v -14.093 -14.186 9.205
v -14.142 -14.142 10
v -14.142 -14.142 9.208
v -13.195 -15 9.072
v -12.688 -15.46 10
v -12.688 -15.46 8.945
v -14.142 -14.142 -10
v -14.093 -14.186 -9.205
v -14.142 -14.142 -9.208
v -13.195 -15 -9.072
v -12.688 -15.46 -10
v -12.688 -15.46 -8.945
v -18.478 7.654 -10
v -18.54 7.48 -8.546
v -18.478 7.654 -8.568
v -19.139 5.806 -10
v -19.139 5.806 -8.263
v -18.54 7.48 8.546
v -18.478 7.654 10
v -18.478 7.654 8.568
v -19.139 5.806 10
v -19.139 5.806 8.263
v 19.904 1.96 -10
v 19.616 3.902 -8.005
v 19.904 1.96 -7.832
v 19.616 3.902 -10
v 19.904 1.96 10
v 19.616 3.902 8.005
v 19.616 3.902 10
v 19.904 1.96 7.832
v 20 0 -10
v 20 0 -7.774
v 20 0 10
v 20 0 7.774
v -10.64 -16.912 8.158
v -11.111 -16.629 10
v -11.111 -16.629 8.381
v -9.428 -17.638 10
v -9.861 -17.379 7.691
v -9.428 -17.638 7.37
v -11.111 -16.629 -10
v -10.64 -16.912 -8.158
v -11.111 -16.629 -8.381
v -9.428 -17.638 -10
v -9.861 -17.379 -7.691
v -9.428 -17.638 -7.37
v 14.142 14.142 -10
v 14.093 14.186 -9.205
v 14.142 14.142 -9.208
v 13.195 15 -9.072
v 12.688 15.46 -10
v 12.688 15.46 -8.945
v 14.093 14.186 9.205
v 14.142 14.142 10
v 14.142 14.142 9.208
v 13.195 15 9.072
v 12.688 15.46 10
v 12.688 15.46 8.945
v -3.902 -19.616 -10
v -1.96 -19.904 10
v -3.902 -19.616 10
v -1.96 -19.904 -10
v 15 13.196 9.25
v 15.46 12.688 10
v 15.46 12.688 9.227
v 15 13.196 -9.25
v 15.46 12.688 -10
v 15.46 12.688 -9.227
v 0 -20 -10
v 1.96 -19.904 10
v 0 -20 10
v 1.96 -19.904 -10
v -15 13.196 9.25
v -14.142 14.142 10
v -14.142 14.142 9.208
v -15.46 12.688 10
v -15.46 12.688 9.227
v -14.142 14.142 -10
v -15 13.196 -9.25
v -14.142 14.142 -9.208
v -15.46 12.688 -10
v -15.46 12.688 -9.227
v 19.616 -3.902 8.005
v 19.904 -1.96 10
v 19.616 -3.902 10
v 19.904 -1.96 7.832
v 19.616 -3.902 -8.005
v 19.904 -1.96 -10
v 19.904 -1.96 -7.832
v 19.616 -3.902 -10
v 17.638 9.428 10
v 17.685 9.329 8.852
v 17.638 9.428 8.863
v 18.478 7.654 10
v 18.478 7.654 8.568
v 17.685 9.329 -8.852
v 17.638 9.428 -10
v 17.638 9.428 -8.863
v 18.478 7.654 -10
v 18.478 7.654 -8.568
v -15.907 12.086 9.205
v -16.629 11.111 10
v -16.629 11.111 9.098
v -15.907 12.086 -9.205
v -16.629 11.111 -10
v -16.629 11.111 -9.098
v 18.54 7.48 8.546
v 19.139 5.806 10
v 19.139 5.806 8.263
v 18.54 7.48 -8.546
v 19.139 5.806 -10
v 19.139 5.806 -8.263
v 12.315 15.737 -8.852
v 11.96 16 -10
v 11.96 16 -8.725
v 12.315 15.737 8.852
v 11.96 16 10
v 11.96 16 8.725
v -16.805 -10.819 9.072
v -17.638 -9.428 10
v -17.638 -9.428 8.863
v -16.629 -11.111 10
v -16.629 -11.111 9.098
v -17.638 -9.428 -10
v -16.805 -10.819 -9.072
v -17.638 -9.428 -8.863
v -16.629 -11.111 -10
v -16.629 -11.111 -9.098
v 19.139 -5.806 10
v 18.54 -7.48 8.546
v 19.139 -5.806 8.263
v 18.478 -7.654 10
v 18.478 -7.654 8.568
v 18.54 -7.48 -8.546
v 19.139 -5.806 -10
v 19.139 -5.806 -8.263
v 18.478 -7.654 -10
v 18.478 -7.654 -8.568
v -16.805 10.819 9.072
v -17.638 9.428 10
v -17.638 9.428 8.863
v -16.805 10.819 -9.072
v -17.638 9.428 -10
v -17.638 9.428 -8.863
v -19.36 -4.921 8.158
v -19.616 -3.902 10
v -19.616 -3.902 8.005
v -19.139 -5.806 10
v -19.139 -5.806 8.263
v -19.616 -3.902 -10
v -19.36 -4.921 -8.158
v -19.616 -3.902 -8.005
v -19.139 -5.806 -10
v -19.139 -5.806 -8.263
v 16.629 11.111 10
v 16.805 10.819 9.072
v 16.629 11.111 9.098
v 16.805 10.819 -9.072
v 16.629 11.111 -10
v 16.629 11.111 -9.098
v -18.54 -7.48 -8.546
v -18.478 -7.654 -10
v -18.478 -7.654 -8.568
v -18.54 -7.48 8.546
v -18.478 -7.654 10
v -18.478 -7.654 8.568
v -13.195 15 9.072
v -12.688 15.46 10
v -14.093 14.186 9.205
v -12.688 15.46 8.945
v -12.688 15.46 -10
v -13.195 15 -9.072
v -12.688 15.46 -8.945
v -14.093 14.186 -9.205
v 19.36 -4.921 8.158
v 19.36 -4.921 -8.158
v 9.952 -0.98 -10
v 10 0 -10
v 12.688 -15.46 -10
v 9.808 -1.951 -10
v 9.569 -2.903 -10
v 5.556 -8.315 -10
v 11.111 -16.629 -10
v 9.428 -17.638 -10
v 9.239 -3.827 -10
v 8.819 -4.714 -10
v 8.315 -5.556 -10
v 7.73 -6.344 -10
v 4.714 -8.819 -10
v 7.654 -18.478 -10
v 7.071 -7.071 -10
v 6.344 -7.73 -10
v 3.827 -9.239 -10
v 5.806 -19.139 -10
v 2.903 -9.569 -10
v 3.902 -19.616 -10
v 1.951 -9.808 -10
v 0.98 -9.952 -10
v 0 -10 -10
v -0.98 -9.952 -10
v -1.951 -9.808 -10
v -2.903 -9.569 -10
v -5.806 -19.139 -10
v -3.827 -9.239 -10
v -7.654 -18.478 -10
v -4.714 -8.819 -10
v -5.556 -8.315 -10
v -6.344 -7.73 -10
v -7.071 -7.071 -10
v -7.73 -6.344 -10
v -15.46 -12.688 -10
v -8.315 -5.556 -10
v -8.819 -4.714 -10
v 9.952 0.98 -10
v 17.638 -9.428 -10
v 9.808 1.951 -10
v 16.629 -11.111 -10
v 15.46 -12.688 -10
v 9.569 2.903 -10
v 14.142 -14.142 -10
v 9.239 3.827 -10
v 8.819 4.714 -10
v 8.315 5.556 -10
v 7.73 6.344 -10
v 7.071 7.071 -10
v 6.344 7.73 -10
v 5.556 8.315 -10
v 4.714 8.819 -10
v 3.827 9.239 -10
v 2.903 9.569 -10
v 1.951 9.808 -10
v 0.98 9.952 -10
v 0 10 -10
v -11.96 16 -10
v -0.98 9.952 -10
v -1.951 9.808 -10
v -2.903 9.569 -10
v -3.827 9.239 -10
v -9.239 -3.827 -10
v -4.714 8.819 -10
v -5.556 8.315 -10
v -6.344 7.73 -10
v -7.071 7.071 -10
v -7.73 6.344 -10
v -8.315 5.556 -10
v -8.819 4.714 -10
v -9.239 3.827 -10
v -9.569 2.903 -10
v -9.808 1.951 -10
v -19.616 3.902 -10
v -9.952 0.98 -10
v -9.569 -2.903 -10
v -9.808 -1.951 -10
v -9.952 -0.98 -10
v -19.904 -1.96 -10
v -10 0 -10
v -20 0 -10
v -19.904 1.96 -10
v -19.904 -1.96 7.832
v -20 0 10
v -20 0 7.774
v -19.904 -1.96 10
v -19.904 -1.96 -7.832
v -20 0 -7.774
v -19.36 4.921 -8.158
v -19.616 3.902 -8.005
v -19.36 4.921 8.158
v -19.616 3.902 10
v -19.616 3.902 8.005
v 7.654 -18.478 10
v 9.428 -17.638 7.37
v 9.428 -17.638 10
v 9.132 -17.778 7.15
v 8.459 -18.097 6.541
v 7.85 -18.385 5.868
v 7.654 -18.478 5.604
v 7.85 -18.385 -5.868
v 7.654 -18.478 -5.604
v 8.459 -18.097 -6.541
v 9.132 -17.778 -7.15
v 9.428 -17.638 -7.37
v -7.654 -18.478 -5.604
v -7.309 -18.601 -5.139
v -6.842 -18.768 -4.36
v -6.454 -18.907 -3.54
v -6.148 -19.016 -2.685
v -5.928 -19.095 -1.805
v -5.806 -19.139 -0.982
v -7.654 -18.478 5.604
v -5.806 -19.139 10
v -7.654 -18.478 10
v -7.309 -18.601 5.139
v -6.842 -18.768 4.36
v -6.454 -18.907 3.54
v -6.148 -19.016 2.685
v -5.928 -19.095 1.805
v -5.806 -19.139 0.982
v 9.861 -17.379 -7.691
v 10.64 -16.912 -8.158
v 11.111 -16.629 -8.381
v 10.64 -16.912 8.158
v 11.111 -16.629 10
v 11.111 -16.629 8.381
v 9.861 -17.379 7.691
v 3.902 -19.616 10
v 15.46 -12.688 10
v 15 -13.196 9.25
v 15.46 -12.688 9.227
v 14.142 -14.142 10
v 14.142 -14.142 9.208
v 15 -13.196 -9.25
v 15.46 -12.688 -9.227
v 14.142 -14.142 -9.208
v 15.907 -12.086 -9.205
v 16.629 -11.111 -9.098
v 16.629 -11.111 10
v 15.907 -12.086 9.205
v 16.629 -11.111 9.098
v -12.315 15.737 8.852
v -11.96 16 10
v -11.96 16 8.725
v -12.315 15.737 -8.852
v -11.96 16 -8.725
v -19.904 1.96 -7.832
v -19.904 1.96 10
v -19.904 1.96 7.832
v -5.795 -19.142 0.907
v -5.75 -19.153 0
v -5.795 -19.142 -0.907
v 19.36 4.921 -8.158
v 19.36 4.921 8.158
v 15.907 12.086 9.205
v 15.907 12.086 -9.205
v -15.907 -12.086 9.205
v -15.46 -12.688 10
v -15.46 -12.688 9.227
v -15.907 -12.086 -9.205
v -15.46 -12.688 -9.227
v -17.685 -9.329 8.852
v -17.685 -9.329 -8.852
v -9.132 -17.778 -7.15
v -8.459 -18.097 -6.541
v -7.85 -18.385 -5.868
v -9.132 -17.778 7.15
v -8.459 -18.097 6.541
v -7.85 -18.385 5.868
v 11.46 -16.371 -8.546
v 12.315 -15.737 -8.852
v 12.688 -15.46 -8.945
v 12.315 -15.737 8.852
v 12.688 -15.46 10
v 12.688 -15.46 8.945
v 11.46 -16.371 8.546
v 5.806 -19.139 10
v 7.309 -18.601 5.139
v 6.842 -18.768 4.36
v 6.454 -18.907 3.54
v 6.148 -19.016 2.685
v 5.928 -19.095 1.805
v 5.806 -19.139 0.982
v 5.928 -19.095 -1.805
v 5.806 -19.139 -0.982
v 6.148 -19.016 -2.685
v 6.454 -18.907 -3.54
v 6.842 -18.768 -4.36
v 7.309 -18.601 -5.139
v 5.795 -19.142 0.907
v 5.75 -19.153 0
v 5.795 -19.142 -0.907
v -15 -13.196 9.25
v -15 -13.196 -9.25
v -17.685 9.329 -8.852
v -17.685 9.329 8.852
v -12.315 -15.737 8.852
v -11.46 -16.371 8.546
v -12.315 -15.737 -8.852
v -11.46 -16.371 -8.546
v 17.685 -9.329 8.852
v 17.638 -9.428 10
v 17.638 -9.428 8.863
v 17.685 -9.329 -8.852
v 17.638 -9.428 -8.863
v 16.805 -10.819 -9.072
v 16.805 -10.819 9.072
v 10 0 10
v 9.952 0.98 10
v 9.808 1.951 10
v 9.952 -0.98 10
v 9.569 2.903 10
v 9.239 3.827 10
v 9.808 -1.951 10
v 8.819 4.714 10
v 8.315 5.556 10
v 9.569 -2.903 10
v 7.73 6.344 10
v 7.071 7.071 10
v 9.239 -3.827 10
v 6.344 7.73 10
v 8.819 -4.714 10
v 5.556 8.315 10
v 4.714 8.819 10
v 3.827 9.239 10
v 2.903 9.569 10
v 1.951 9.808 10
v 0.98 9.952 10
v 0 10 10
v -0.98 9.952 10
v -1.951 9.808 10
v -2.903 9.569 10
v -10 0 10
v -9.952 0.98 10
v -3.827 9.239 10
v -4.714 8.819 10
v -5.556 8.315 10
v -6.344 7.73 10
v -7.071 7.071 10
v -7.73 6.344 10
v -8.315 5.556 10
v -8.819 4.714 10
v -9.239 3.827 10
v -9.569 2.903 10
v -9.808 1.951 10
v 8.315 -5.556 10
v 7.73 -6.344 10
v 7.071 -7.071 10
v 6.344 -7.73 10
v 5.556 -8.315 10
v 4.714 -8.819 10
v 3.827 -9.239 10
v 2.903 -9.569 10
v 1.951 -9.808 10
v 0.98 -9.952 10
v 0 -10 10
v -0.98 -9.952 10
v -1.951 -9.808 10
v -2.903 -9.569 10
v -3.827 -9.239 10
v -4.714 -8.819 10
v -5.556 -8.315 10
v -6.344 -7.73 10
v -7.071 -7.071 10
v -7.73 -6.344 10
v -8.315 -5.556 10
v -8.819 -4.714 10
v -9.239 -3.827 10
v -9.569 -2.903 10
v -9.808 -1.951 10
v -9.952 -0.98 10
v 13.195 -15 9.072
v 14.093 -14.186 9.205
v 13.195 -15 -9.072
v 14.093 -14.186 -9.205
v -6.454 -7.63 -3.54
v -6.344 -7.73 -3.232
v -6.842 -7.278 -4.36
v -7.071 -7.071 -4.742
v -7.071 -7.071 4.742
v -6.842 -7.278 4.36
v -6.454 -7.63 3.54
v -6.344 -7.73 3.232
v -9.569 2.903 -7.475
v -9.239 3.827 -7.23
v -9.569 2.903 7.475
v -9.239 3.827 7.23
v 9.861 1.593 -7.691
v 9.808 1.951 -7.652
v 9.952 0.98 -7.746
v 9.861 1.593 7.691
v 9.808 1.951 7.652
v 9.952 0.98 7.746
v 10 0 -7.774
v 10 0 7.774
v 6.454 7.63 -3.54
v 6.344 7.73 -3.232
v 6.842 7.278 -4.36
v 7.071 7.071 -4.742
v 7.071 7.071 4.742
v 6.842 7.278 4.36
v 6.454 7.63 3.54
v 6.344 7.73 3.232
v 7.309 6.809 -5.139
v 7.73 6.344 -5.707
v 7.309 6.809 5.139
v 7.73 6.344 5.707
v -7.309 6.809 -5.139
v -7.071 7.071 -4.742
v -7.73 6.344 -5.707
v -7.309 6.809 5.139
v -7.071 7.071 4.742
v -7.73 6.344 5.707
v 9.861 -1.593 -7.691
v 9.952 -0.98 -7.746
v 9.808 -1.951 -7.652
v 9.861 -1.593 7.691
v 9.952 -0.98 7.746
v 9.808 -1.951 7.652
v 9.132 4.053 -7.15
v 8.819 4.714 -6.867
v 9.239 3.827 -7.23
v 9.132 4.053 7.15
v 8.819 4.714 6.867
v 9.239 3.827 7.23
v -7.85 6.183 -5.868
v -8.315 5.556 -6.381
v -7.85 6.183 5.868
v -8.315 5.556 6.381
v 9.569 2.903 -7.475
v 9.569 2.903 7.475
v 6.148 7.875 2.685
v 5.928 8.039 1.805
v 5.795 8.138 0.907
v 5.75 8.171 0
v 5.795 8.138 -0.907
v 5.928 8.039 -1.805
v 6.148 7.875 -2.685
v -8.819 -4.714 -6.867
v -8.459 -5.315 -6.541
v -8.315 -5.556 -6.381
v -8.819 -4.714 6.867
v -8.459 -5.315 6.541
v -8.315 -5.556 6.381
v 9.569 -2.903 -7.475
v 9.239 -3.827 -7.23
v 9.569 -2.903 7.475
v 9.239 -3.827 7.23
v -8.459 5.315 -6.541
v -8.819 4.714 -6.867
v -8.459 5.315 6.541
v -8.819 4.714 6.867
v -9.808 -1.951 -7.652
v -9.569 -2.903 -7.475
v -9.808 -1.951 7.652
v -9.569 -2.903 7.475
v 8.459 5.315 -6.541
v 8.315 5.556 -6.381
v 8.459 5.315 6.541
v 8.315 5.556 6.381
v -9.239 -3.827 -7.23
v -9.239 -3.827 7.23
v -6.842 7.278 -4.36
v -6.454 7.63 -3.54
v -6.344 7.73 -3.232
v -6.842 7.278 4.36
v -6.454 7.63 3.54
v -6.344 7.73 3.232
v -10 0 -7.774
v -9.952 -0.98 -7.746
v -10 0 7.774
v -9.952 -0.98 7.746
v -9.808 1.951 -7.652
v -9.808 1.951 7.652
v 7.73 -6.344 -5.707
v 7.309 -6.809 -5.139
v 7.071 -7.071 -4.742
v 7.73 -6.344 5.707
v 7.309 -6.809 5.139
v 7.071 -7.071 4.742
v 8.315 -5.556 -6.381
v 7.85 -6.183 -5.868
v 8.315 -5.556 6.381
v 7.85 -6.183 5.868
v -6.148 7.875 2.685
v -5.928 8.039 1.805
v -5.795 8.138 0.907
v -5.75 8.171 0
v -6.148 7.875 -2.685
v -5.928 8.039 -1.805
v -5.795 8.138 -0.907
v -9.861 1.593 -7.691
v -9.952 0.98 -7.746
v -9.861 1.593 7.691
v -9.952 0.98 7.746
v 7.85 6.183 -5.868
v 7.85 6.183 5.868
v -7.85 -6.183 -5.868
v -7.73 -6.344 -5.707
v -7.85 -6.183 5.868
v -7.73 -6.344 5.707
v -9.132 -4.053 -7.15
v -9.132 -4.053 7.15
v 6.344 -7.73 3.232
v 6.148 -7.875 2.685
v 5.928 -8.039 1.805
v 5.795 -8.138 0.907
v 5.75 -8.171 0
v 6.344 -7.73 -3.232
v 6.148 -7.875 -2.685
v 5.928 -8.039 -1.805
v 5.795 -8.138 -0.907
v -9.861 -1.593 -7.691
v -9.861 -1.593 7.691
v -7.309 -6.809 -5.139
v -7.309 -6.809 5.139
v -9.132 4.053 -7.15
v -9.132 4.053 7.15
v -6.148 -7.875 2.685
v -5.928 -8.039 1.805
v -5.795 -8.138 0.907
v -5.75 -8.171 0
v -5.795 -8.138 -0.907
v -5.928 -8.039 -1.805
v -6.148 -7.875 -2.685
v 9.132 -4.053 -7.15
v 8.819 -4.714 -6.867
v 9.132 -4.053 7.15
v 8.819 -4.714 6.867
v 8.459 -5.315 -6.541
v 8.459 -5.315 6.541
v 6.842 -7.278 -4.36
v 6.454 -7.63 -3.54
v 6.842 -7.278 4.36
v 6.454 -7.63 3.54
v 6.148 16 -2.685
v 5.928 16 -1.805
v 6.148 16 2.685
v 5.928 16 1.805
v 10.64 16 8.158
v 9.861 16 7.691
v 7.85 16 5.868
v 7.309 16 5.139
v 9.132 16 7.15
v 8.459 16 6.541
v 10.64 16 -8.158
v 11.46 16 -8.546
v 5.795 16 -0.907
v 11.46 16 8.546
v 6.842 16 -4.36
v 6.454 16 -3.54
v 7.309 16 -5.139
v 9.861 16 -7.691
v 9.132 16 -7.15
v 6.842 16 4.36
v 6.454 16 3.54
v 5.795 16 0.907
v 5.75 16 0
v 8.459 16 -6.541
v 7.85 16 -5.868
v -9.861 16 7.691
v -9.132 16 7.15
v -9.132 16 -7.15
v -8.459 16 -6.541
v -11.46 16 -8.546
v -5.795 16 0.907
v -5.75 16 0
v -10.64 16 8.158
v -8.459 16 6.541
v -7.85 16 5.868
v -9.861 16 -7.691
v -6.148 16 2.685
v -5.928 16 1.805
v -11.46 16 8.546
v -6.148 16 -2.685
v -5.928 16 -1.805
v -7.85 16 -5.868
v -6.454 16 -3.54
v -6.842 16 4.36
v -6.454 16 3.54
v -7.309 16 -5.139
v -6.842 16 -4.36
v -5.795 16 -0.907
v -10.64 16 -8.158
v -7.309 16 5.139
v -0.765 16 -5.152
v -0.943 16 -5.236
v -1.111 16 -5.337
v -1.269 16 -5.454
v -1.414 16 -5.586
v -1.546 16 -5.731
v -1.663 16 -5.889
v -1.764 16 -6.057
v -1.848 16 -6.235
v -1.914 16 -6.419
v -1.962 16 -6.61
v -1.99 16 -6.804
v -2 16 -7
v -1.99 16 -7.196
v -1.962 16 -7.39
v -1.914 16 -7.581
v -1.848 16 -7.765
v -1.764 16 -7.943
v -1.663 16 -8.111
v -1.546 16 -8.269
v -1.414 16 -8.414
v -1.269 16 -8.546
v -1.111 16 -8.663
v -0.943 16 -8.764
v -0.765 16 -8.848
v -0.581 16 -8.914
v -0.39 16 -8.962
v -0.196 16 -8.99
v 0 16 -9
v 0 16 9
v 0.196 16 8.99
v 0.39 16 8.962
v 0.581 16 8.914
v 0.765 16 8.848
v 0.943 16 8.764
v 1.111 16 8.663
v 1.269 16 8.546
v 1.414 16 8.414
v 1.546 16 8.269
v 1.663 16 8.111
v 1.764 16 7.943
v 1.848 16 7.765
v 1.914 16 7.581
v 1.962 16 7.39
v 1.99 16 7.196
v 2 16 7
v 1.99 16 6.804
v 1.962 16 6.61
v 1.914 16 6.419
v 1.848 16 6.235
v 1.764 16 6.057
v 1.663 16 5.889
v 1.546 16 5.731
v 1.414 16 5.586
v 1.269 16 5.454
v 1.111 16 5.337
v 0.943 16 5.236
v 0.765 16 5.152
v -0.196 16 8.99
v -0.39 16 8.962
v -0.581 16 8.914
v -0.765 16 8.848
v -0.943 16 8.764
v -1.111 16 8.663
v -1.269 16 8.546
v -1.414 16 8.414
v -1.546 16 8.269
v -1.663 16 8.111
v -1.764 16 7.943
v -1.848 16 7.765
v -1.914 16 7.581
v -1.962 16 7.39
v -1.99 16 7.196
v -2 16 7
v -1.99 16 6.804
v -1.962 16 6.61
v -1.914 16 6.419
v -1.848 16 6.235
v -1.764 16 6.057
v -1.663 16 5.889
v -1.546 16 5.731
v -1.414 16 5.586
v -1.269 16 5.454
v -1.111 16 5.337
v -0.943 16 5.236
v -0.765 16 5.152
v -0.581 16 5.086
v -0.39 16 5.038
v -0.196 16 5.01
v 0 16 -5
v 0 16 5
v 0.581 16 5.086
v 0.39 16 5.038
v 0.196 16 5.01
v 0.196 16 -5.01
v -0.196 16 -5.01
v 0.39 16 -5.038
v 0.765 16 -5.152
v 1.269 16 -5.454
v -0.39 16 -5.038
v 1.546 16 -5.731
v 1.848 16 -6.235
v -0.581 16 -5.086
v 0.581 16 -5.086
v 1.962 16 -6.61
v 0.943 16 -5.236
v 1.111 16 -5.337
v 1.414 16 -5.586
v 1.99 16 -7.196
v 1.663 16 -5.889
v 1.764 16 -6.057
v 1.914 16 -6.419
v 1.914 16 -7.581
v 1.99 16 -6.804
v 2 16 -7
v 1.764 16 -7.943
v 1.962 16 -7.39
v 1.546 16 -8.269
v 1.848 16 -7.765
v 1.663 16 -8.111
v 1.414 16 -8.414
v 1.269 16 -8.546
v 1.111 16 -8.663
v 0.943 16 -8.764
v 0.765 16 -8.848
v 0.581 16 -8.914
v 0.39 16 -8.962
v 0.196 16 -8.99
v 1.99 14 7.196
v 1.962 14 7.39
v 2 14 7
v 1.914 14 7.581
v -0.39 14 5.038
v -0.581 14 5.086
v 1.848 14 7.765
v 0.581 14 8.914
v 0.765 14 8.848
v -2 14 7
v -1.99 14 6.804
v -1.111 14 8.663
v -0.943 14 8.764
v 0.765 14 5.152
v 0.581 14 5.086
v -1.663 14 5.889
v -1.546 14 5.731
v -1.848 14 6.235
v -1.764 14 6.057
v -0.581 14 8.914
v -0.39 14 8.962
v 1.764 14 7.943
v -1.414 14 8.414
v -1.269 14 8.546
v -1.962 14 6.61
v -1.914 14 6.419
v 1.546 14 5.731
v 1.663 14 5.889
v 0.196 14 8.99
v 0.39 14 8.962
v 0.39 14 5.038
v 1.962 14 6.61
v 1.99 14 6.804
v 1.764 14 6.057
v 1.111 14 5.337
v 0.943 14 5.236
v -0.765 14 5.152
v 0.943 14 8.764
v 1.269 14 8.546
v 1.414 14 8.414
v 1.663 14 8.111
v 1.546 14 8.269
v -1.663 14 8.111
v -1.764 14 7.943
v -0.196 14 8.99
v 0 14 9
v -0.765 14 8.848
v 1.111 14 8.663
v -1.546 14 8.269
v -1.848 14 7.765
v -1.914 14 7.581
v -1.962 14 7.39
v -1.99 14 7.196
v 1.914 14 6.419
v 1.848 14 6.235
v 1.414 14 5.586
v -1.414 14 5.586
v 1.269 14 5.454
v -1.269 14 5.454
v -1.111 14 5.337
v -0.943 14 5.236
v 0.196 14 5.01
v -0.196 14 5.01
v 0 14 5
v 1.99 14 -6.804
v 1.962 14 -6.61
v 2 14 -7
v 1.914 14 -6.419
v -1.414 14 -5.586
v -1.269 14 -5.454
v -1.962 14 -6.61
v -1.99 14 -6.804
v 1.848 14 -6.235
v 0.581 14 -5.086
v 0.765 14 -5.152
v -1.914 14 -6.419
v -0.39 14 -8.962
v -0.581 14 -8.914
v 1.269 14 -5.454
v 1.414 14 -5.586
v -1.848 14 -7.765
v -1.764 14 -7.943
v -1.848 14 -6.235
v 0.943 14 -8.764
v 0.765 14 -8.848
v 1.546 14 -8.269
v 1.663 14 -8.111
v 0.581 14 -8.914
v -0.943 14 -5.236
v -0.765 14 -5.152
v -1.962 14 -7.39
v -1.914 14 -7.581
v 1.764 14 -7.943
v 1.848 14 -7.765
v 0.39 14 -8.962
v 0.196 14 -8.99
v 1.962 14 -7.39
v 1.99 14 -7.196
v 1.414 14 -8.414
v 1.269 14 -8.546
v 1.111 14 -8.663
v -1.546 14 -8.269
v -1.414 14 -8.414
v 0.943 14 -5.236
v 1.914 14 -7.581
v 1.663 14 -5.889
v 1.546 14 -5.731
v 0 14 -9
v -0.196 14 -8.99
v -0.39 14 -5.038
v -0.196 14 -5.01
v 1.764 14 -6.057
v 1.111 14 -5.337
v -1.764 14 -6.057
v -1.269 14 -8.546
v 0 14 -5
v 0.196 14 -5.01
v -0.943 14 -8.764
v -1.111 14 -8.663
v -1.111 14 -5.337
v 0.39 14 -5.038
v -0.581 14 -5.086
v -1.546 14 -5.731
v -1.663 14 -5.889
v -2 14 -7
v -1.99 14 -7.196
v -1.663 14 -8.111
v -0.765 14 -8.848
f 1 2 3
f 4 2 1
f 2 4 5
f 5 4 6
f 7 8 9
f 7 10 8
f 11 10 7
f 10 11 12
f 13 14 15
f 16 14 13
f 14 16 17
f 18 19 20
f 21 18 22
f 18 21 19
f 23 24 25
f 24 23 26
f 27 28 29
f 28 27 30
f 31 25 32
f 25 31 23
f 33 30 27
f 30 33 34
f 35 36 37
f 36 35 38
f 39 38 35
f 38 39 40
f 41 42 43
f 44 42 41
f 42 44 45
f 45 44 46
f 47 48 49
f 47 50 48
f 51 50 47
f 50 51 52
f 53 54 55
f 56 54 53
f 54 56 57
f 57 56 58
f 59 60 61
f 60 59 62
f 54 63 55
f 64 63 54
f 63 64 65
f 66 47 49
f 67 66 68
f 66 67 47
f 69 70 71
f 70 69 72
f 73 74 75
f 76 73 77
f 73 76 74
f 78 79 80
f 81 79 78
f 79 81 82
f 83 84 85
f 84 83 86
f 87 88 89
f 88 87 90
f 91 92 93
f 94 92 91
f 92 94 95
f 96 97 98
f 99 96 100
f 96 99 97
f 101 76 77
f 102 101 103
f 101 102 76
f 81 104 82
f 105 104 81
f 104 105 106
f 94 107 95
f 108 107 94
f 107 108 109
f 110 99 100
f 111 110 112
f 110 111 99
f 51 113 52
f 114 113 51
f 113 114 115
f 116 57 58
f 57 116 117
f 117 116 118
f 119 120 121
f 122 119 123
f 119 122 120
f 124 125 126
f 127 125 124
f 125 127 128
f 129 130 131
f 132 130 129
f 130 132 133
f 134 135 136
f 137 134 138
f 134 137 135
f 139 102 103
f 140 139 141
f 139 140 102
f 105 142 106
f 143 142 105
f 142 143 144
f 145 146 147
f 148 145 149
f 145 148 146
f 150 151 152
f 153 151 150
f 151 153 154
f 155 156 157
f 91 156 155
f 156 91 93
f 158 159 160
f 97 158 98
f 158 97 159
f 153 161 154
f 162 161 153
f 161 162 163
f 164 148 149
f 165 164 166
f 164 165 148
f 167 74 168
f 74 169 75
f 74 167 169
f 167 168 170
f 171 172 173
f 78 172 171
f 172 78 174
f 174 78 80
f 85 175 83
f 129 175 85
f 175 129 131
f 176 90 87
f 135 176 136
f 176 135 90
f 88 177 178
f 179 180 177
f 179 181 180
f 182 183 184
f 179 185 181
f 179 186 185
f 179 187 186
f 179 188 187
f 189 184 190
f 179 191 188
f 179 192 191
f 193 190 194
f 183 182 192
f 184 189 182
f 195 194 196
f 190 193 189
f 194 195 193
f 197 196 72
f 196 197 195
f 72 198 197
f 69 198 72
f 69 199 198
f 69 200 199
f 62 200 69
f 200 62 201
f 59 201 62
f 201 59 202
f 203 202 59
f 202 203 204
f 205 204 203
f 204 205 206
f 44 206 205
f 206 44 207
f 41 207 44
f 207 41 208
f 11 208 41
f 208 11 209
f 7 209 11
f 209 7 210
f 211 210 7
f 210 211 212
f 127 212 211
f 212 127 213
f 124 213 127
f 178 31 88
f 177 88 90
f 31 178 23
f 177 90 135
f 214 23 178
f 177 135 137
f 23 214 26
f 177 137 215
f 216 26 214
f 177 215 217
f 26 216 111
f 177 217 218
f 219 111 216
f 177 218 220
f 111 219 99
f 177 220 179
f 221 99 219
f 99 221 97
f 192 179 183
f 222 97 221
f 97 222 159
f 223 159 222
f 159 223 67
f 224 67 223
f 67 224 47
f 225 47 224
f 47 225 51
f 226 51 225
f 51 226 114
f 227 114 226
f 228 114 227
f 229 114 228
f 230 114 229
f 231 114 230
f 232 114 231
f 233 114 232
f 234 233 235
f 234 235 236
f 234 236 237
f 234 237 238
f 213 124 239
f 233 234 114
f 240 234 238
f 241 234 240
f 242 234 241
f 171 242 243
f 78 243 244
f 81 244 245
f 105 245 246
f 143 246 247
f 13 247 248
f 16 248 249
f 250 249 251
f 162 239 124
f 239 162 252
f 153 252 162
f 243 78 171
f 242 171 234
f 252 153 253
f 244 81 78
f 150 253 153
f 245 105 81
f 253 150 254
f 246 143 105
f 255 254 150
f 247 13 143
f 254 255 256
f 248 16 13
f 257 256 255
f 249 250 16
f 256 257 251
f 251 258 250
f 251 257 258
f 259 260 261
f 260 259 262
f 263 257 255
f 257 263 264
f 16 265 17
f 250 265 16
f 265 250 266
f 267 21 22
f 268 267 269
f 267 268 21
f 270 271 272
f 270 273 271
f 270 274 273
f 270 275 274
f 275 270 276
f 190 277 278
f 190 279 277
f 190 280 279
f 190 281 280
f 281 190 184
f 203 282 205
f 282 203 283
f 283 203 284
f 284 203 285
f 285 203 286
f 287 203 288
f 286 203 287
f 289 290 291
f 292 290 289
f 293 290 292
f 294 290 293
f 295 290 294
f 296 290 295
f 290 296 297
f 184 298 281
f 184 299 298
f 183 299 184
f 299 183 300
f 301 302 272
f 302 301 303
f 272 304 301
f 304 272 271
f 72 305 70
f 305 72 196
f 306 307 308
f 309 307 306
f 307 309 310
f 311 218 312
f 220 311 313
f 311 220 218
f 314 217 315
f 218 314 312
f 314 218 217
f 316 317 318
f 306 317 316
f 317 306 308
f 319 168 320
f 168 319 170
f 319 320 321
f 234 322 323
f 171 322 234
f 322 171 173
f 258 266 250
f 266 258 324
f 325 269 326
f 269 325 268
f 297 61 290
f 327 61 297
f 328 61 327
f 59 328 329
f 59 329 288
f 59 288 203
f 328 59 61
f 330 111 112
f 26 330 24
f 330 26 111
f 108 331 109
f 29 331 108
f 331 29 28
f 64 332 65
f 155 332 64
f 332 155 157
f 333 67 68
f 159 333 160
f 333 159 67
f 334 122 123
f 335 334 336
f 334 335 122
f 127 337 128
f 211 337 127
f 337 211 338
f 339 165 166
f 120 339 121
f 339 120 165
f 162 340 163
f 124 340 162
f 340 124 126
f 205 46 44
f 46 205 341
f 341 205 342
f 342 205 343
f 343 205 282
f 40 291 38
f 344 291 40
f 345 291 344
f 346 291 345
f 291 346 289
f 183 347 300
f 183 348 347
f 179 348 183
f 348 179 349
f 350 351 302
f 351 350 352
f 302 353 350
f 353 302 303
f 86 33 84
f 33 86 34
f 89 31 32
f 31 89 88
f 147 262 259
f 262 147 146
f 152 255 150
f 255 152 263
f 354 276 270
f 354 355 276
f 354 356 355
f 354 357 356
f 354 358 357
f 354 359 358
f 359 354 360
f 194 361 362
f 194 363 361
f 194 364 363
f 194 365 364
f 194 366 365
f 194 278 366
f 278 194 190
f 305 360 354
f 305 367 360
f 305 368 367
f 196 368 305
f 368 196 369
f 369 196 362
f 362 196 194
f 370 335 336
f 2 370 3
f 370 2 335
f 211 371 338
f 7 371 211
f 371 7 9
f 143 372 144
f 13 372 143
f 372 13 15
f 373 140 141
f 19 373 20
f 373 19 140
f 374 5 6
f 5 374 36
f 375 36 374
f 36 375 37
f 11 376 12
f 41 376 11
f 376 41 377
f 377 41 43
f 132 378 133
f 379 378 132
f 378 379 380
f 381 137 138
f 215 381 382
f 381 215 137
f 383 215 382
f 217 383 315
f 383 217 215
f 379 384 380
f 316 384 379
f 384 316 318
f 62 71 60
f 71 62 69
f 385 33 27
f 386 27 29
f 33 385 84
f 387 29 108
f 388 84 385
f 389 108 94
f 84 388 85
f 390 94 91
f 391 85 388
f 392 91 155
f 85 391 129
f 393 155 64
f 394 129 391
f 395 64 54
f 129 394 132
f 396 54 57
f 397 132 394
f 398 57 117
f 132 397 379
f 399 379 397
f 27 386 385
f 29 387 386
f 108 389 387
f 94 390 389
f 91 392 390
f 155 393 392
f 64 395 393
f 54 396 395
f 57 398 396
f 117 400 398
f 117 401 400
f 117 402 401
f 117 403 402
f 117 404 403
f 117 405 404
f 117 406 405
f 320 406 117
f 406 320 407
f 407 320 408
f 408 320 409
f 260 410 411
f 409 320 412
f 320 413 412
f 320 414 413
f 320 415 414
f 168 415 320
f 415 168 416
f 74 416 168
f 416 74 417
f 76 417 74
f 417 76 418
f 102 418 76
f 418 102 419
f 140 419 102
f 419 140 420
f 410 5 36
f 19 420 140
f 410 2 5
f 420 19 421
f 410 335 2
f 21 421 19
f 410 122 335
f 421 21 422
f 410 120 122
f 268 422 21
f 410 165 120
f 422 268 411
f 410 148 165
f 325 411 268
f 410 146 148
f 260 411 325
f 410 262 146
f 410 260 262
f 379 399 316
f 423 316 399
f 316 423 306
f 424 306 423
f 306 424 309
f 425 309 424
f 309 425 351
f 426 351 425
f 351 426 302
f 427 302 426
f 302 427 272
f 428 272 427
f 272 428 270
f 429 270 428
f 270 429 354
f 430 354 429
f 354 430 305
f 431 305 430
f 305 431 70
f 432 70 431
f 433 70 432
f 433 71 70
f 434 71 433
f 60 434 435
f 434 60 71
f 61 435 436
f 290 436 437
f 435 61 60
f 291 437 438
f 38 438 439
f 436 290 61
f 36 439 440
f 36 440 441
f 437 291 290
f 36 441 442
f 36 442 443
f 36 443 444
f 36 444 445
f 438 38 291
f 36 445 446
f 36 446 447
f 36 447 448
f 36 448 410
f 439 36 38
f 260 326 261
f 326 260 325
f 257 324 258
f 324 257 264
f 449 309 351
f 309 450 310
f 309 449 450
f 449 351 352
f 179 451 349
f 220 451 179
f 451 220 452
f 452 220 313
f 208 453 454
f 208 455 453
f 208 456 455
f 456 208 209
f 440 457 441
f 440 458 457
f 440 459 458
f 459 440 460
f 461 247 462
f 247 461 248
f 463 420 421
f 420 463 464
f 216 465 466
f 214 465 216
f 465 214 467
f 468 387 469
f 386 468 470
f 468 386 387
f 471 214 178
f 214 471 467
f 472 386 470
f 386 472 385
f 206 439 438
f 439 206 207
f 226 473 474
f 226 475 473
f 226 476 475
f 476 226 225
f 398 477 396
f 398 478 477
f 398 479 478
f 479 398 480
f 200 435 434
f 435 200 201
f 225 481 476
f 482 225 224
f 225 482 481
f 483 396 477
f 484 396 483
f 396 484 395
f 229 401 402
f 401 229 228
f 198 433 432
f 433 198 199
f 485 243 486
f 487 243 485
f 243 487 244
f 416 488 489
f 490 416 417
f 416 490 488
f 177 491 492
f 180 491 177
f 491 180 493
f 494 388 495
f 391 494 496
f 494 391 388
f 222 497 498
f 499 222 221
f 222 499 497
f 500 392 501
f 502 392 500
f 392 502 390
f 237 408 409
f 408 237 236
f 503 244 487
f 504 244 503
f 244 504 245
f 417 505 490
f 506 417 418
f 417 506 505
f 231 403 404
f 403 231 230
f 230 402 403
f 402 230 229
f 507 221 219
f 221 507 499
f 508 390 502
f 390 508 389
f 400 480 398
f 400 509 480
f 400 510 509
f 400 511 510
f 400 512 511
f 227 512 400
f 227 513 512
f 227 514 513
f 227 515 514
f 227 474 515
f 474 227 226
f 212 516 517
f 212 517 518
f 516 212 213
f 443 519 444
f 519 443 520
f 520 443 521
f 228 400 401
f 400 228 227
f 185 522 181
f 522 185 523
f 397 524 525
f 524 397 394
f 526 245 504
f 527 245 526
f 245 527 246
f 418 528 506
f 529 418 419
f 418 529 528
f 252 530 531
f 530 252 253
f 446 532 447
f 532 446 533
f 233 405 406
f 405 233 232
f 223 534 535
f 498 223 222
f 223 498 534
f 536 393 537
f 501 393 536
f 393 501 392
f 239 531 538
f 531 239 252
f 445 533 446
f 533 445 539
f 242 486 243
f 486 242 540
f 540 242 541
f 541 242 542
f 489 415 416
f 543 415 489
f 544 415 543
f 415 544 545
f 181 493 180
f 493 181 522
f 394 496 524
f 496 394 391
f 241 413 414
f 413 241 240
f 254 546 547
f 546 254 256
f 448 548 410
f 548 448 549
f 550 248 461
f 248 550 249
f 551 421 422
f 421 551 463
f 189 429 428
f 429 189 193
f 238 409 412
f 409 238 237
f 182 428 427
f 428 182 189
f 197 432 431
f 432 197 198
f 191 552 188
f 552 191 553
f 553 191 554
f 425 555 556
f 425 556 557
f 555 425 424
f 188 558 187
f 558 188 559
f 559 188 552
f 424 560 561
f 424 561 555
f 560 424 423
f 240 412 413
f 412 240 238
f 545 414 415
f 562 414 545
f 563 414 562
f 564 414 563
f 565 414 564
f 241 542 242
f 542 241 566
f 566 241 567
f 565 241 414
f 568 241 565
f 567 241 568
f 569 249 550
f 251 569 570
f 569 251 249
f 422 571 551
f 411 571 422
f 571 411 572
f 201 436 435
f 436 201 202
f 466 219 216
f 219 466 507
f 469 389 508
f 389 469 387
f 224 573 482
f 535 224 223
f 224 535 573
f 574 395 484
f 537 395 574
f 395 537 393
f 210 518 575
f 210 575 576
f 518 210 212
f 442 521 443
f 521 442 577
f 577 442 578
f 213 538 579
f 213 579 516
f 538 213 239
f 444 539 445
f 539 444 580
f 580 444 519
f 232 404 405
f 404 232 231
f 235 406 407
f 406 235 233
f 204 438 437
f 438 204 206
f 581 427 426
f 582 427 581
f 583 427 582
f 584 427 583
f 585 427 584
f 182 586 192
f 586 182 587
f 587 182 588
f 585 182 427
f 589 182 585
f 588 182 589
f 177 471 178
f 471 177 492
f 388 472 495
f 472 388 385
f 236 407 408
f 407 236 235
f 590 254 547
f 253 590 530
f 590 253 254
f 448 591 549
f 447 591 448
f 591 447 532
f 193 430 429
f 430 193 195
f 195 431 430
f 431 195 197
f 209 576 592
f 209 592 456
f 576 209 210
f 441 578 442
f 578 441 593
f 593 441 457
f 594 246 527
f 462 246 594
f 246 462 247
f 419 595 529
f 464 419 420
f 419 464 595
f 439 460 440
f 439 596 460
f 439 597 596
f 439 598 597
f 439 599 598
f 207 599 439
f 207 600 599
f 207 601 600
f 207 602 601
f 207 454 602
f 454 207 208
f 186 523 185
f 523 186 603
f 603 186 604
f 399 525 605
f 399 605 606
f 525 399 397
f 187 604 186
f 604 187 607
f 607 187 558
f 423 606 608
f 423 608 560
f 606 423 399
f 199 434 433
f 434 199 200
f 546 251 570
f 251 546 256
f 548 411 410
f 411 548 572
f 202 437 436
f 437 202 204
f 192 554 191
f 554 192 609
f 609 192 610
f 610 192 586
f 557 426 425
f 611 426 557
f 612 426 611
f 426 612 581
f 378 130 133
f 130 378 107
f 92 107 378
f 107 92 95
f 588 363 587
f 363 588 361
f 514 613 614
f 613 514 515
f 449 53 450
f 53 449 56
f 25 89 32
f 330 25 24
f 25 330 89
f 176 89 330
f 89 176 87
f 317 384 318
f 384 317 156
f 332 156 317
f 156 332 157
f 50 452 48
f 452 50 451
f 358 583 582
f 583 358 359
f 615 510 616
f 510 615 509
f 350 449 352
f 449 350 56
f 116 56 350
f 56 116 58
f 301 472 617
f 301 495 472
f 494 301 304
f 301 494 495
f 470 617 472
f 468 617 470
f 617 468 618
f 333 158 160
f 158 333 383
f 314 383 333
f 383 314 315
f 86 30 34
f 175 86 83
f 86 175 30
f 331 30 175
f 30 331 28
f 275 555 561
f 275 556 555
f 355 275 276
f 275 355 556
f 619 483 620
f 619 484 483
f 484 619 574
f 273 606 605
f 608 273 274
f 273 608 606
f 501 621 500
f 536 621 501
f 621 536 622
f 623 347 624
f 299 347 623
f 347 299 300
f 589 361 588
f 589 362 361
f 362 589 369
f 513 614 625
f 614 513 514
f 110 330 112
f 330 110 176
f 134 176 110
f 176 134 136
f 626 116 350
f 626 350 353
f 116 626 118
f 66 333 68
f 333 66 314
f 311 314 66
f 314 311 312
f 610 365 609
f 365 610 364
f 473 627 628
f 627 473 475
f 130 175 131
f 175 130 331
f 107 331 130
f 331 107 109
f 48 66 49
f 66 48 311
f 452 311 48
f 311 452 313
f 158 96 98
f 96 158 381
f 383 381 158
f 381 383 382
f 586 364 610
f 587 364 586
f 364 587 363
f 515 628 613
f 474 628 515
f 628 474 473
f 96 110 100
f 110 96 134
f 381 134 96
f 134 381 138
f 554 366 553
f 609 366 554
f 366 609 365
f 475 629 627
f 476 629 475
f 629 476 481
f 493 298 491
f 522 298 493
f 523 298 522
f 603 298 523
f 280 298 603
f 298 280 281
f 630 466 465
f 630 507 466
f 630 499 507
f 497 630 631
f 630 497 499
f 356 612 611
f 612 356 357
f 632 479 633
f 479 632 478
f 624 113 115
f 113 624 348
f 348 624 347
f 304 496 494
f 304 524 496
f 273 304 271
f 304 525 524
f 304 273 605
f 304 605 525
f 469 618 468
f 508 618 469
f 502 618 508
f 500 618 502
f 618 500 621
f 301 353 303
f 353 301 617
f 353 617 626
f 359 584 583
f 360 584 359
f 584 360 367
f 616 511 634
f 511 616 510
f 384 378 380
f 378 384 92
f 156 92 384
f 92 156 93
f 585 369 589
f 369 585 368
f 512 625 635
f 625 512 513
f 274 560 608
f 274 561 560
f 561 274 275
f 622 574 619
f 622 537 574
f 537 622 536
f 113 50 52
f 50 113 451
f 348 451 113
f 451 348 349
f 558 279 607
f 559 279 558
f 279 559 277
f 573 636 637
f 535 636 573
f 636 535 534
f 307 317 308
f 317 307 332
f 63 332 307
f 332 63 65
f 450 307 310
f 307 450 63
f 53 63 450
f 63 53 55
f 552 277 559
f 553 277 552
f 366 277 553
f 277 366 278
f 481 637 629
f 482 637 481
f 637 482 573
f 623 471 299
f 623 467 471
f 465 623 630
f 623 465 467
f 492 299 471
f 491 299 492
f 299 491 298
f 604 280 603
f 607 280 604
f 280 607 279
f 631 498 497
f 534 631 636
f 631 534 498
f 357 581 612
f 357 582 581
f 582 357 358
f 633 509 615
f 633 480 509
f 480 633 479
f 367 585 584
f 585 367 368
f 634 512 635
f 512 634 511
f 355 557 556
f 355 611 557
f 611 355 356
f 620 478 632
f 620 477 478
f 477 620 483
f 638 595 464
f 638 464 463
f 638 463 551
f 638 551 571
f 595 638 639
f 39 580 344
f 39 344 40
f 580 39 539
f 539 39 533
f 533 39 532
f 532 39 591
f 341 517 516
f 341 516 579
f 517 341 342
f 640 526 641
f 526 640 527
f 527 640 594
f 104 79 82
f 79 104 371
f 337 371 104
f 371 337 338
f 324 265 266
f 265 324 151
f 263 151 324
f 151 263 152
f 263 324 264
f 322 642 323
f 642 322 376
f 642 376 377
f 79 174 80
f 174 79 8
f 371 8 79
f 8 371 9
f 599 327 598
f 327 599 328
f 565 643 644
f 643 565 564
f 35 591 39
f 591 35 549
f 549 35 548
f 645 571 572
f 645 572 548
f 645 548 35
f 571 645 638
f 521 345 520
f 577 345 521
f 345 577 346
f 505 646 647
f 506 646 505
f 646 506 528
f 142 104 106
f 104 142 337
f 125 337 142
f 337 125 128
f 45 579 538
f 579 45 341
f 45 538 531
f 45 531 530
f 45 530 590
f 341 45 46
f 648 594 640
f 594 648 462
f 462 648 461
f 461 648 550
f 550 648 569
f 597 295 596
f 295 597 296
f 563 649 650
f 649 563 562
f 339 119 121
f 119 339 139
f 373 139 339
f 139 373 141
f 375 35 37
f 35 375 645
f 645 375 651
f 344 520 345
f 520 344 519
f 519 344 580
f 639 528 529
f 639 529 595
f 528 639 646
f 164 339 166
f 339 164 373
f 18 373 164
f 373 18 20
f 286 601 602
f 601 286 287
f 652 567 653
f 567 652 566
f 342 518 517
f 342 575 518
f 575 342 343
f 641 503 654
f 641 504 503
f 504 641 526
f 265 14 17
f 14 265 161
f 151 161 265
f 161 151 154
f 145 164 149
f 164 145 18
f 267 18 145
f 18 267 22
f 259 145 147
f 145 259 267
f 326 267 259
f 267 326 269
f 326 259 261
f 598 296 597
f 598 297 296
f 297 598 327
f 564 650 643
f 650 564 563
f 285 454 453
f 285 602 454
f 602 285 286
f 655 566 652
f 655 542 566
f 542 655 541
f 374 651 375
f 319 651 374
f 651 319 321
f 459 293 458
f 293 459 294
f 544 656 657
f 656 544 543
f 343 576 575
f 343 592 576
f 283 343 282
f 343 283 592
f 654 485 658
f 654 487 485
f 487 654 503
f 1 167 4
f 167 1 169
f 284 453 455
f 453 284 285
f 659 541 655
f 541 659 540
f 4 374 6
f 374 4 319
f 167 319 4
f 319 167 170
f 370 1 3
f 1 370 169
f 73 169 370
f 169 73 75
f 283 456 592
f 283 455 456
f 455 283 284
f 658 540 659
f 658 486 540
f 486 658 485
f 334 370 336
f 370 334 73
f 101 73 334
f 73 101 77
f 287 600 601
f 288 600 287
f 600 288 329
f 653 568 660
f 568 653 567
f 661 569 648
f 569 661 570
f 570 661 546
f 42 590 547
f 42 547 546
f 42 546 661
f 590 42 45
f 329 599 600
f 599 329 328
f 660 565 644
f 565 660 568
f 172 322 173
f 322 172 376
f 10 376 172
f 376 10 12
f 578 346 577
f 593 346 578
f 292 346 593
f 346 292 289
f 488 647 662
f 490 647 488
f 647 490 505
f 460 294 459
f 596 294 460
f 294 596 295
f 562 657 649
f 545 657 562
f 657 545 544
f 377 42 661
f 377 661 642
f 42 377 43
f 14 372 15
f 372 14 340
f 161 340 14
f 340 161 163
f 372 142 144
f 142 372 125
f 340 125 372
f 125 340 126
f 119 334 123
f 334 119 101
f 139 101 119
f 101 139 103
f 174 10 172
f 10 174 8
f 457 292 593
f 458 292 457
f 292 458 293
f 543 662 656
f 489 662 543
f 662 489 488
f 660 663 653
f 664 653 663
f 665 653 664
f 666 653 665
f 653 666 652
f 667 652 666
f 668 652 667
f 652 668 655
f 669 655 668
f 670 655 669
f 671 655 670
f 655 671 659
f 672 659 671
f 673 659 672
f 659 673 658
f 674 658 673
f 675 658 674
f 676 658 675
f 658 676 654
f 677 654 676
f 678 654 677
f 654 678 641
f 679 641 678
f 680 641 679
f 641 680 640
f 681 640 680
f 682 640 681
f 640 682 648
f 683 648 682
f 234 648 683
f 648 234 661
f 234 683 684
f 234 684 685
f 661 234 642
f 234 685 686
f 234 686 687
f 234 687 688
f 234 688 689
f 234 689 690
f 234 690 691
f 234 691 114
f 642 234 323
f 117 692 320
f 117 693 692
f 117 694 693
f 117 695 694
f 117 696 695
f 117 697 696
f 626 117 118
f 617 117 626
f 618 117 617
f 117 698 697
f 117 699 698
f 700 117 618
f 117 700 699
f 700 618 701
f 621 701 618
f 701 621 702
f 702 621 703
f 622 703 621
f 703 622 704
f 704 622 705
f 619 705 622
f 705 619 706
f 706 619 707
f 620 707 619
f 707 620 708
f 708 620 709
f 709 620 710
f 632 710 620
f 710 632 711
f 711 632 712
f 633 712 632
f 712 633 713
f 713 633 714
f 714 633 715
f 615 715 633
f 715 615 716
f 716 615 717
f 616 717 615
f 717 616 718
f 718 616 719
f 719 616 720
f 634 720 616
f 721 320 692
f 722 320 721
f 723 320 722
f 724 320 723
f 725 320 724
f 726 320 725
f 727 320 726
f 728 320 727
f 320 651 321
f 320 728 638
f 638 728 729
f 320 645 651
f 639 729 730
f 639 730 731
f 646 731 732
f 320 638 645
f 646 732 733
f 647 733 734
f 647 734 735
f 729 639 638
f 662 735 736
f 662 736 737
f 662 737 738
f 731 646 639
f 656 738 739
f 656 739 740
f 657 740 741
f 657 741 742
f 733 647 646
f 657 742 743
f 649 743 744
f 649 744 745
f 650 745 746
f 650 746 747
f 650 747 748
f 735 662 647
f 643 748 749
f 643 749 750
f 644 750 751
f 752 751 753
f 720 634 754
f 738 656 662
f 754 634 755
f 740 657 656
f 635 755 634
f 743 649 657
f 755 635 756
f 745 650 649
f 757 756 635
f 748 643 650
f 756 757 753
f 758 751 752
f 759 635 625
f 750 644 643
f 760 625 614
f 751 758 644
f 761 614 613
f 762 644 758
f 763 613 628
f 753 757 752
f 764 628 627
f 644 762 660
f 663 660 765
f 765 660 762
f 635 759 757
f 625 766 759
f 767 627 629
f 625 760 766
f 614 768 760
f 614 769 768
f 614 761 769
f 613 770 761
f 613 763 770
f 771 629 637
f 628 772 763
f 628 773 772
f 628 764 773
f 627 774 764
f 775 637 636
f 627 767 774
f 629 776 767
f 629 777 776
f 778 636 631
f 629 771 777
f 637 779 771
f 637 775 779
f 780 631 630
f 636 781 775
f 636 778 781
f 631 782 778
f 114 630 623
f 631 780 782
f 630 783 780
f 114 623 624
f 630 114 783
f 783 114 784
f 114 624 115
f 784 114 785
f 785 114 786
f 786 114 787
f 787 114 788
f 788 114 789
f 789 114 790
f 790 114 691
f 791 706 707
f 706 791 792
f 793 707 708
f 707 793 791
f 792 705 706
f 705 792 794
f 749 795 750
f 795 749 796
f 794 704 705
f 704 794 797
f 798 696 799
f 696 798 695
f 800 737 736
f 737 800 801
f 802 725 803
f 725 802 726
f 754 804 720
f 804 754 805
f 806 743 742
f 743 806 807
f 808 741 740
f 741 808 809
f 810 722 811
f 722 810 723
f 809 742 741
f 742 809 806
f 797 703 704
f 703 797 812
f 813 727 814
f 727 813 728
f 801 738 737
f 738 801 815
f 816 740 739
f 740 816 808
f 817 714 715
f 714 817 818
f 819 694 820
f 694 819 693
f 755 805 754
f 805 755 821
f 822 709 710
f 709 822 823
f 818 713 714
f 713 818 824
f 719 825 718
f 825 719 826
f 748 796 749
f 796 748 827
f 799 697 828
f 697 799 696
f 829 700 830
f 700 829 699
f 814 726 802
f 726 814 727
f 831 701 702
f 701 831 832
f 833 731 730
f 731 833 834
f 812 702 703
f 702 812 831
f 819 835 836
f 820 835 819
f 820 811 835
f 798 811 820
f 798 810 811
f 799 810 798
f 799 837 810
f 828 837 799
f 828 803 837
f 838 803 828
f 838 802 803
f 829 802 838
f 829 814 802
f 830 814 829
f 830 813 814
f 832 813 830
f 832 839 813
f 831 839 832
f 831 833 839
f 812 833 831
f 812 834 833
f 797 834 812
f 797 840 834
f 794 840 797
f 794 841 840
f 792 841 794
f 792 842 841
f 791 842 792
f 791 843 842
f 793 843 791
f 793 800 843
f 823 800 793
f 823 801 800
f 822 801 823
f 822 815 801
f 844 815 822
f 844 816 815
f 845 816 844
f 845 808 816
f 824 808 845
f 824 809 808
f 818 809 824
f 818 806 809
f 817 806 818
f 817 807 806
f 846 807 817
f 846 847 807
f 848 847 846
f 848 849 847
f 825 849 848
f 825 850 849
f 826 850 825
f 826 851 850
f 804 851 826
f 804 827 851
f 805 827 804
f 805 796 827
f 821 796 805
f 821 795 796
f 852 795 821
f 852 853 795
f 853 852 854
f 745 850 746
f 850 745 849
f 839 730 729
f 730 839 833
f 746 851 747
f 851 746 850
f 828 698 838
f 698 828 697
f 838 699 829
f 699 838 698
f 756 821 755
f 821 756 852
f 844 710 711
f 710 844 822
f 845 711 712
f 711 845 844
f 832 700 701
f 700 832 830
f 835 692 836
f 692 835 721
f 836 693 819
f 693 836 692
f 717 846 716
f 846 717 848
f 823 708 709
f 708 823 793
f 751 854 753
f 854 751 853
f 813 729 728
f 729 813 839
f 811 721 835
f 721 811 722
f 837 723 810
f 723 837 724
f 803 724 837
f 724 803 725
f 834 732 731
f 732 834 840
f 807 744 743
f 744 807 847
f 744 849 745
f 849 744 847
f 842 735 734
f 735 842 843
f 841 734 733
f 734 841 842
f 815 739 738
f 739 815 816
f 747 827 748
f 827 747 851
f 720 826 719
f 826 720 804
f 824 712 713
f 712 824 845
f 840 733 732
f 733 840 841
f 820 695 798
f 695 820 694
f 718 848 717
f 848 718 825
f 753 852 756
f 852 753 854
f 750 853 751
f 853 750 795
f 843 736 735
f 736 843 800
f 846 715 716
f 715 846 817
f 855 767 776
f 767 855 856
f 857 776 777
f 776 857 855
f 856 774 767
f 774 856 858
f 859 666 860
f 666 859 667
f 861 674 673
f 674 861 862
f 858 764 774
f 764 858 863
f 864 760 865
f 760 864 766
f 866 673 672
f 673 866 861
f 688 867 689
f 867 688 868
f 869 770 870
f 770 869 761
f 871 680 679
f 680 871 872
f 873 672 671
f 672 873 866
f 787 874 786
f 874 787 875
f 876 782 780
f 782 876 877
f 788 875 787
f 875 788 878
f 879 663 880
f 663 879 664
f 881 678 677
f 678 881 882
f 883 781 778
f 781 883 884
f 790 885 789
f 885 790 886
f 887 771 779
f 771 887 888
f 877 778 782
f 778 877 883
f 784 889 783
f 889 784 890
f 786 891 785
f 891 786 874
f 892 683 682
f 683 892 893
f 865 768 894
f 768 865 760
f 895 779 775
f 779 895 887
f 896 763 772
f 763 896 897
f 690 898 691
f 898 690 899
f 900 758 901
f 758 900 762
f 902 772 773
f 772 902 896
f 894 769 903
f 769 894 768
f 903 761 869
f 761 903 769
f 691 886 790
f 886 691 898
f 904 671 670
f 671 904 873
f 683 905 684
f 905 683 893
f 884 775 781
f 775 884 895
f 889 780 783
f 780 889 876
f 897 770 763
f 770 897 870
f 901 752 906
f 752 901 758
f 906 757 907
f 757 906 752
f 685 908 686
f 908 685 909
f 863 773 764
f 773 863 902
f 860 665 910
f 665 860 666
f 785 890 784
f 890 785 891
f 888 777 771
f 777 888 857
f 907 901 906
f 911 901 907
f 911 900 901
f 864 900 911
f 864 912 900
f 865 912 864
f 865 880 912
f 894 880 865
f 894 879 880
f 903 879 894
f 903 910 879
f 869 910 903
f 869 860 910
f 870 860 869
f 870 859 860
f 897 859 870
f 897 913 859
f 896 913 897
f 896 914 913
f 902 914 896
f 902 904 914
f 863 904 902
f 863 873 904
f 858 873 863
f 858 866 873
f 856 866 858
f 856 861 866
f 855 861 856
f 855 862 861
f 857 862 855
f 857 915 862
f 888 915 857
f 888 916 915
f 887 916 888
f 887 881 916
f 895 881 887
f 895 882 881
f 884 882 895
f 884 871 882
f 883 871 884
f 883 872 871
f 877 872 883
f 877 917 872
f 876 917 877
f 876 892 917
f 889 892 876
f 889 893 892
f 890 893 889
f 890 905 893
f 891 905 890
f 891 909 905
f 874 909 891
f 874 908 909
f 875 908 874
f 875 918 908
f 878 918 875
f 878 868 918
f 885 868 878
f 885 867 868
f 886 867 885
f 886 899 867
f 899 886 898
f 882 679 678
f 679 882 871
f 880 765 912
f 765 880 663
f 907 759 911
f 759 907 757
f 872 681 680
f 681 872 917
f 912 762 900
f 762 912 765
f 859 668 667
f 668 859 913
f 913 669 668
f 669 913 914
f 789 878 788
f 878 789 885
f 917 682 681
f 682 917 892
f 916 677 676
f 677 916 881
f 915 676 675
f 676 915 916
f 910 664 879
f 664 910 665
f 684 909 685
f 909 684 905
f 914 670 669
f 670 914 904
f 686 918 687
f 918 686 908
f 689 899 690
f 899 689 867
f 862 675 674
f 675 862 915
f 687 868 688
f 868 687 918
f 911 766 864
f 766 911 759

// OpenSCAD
// COBRA Vertebra - T7 V13
// Height: 20.0mm, OD: 40.0mm

$fn = 64;

difference() {
    // Outer cylinder
    cylinder(h=20.0, d=40.0, center=true);
    
    // Inner channel
    cylinder(h=22.0, d=20.0, center=true);

    // Battery cavity 1
    rotate([0, 0, 0])
    translate([15.0, 0, 0])
    rotate([90, 0, 0])
    cylinder(h=74.0, d=18.5, center=true);

    // Battery cavity 2
    rotate([0, 0, 180])
    translate([15.0, 0, 0])
    rotate([90, 0, 0])
    cylinder(h=74.0, d=18.5, center=true);

    // Solar panel cavity
    translate([0, 18.0, 0])
    cube([50, 4, 30], center=true);

    // Pivot holes
    translate([0, 20.0, 7.0])
    rotate([90, 0, 0])
    cylinder(h=12.0, d=4, center=true);
    
    translate([0, 20.0, -7.0])
    rotate([90, 0, 0])
    cylinder(h=12.0, d=4, center=true);
}
